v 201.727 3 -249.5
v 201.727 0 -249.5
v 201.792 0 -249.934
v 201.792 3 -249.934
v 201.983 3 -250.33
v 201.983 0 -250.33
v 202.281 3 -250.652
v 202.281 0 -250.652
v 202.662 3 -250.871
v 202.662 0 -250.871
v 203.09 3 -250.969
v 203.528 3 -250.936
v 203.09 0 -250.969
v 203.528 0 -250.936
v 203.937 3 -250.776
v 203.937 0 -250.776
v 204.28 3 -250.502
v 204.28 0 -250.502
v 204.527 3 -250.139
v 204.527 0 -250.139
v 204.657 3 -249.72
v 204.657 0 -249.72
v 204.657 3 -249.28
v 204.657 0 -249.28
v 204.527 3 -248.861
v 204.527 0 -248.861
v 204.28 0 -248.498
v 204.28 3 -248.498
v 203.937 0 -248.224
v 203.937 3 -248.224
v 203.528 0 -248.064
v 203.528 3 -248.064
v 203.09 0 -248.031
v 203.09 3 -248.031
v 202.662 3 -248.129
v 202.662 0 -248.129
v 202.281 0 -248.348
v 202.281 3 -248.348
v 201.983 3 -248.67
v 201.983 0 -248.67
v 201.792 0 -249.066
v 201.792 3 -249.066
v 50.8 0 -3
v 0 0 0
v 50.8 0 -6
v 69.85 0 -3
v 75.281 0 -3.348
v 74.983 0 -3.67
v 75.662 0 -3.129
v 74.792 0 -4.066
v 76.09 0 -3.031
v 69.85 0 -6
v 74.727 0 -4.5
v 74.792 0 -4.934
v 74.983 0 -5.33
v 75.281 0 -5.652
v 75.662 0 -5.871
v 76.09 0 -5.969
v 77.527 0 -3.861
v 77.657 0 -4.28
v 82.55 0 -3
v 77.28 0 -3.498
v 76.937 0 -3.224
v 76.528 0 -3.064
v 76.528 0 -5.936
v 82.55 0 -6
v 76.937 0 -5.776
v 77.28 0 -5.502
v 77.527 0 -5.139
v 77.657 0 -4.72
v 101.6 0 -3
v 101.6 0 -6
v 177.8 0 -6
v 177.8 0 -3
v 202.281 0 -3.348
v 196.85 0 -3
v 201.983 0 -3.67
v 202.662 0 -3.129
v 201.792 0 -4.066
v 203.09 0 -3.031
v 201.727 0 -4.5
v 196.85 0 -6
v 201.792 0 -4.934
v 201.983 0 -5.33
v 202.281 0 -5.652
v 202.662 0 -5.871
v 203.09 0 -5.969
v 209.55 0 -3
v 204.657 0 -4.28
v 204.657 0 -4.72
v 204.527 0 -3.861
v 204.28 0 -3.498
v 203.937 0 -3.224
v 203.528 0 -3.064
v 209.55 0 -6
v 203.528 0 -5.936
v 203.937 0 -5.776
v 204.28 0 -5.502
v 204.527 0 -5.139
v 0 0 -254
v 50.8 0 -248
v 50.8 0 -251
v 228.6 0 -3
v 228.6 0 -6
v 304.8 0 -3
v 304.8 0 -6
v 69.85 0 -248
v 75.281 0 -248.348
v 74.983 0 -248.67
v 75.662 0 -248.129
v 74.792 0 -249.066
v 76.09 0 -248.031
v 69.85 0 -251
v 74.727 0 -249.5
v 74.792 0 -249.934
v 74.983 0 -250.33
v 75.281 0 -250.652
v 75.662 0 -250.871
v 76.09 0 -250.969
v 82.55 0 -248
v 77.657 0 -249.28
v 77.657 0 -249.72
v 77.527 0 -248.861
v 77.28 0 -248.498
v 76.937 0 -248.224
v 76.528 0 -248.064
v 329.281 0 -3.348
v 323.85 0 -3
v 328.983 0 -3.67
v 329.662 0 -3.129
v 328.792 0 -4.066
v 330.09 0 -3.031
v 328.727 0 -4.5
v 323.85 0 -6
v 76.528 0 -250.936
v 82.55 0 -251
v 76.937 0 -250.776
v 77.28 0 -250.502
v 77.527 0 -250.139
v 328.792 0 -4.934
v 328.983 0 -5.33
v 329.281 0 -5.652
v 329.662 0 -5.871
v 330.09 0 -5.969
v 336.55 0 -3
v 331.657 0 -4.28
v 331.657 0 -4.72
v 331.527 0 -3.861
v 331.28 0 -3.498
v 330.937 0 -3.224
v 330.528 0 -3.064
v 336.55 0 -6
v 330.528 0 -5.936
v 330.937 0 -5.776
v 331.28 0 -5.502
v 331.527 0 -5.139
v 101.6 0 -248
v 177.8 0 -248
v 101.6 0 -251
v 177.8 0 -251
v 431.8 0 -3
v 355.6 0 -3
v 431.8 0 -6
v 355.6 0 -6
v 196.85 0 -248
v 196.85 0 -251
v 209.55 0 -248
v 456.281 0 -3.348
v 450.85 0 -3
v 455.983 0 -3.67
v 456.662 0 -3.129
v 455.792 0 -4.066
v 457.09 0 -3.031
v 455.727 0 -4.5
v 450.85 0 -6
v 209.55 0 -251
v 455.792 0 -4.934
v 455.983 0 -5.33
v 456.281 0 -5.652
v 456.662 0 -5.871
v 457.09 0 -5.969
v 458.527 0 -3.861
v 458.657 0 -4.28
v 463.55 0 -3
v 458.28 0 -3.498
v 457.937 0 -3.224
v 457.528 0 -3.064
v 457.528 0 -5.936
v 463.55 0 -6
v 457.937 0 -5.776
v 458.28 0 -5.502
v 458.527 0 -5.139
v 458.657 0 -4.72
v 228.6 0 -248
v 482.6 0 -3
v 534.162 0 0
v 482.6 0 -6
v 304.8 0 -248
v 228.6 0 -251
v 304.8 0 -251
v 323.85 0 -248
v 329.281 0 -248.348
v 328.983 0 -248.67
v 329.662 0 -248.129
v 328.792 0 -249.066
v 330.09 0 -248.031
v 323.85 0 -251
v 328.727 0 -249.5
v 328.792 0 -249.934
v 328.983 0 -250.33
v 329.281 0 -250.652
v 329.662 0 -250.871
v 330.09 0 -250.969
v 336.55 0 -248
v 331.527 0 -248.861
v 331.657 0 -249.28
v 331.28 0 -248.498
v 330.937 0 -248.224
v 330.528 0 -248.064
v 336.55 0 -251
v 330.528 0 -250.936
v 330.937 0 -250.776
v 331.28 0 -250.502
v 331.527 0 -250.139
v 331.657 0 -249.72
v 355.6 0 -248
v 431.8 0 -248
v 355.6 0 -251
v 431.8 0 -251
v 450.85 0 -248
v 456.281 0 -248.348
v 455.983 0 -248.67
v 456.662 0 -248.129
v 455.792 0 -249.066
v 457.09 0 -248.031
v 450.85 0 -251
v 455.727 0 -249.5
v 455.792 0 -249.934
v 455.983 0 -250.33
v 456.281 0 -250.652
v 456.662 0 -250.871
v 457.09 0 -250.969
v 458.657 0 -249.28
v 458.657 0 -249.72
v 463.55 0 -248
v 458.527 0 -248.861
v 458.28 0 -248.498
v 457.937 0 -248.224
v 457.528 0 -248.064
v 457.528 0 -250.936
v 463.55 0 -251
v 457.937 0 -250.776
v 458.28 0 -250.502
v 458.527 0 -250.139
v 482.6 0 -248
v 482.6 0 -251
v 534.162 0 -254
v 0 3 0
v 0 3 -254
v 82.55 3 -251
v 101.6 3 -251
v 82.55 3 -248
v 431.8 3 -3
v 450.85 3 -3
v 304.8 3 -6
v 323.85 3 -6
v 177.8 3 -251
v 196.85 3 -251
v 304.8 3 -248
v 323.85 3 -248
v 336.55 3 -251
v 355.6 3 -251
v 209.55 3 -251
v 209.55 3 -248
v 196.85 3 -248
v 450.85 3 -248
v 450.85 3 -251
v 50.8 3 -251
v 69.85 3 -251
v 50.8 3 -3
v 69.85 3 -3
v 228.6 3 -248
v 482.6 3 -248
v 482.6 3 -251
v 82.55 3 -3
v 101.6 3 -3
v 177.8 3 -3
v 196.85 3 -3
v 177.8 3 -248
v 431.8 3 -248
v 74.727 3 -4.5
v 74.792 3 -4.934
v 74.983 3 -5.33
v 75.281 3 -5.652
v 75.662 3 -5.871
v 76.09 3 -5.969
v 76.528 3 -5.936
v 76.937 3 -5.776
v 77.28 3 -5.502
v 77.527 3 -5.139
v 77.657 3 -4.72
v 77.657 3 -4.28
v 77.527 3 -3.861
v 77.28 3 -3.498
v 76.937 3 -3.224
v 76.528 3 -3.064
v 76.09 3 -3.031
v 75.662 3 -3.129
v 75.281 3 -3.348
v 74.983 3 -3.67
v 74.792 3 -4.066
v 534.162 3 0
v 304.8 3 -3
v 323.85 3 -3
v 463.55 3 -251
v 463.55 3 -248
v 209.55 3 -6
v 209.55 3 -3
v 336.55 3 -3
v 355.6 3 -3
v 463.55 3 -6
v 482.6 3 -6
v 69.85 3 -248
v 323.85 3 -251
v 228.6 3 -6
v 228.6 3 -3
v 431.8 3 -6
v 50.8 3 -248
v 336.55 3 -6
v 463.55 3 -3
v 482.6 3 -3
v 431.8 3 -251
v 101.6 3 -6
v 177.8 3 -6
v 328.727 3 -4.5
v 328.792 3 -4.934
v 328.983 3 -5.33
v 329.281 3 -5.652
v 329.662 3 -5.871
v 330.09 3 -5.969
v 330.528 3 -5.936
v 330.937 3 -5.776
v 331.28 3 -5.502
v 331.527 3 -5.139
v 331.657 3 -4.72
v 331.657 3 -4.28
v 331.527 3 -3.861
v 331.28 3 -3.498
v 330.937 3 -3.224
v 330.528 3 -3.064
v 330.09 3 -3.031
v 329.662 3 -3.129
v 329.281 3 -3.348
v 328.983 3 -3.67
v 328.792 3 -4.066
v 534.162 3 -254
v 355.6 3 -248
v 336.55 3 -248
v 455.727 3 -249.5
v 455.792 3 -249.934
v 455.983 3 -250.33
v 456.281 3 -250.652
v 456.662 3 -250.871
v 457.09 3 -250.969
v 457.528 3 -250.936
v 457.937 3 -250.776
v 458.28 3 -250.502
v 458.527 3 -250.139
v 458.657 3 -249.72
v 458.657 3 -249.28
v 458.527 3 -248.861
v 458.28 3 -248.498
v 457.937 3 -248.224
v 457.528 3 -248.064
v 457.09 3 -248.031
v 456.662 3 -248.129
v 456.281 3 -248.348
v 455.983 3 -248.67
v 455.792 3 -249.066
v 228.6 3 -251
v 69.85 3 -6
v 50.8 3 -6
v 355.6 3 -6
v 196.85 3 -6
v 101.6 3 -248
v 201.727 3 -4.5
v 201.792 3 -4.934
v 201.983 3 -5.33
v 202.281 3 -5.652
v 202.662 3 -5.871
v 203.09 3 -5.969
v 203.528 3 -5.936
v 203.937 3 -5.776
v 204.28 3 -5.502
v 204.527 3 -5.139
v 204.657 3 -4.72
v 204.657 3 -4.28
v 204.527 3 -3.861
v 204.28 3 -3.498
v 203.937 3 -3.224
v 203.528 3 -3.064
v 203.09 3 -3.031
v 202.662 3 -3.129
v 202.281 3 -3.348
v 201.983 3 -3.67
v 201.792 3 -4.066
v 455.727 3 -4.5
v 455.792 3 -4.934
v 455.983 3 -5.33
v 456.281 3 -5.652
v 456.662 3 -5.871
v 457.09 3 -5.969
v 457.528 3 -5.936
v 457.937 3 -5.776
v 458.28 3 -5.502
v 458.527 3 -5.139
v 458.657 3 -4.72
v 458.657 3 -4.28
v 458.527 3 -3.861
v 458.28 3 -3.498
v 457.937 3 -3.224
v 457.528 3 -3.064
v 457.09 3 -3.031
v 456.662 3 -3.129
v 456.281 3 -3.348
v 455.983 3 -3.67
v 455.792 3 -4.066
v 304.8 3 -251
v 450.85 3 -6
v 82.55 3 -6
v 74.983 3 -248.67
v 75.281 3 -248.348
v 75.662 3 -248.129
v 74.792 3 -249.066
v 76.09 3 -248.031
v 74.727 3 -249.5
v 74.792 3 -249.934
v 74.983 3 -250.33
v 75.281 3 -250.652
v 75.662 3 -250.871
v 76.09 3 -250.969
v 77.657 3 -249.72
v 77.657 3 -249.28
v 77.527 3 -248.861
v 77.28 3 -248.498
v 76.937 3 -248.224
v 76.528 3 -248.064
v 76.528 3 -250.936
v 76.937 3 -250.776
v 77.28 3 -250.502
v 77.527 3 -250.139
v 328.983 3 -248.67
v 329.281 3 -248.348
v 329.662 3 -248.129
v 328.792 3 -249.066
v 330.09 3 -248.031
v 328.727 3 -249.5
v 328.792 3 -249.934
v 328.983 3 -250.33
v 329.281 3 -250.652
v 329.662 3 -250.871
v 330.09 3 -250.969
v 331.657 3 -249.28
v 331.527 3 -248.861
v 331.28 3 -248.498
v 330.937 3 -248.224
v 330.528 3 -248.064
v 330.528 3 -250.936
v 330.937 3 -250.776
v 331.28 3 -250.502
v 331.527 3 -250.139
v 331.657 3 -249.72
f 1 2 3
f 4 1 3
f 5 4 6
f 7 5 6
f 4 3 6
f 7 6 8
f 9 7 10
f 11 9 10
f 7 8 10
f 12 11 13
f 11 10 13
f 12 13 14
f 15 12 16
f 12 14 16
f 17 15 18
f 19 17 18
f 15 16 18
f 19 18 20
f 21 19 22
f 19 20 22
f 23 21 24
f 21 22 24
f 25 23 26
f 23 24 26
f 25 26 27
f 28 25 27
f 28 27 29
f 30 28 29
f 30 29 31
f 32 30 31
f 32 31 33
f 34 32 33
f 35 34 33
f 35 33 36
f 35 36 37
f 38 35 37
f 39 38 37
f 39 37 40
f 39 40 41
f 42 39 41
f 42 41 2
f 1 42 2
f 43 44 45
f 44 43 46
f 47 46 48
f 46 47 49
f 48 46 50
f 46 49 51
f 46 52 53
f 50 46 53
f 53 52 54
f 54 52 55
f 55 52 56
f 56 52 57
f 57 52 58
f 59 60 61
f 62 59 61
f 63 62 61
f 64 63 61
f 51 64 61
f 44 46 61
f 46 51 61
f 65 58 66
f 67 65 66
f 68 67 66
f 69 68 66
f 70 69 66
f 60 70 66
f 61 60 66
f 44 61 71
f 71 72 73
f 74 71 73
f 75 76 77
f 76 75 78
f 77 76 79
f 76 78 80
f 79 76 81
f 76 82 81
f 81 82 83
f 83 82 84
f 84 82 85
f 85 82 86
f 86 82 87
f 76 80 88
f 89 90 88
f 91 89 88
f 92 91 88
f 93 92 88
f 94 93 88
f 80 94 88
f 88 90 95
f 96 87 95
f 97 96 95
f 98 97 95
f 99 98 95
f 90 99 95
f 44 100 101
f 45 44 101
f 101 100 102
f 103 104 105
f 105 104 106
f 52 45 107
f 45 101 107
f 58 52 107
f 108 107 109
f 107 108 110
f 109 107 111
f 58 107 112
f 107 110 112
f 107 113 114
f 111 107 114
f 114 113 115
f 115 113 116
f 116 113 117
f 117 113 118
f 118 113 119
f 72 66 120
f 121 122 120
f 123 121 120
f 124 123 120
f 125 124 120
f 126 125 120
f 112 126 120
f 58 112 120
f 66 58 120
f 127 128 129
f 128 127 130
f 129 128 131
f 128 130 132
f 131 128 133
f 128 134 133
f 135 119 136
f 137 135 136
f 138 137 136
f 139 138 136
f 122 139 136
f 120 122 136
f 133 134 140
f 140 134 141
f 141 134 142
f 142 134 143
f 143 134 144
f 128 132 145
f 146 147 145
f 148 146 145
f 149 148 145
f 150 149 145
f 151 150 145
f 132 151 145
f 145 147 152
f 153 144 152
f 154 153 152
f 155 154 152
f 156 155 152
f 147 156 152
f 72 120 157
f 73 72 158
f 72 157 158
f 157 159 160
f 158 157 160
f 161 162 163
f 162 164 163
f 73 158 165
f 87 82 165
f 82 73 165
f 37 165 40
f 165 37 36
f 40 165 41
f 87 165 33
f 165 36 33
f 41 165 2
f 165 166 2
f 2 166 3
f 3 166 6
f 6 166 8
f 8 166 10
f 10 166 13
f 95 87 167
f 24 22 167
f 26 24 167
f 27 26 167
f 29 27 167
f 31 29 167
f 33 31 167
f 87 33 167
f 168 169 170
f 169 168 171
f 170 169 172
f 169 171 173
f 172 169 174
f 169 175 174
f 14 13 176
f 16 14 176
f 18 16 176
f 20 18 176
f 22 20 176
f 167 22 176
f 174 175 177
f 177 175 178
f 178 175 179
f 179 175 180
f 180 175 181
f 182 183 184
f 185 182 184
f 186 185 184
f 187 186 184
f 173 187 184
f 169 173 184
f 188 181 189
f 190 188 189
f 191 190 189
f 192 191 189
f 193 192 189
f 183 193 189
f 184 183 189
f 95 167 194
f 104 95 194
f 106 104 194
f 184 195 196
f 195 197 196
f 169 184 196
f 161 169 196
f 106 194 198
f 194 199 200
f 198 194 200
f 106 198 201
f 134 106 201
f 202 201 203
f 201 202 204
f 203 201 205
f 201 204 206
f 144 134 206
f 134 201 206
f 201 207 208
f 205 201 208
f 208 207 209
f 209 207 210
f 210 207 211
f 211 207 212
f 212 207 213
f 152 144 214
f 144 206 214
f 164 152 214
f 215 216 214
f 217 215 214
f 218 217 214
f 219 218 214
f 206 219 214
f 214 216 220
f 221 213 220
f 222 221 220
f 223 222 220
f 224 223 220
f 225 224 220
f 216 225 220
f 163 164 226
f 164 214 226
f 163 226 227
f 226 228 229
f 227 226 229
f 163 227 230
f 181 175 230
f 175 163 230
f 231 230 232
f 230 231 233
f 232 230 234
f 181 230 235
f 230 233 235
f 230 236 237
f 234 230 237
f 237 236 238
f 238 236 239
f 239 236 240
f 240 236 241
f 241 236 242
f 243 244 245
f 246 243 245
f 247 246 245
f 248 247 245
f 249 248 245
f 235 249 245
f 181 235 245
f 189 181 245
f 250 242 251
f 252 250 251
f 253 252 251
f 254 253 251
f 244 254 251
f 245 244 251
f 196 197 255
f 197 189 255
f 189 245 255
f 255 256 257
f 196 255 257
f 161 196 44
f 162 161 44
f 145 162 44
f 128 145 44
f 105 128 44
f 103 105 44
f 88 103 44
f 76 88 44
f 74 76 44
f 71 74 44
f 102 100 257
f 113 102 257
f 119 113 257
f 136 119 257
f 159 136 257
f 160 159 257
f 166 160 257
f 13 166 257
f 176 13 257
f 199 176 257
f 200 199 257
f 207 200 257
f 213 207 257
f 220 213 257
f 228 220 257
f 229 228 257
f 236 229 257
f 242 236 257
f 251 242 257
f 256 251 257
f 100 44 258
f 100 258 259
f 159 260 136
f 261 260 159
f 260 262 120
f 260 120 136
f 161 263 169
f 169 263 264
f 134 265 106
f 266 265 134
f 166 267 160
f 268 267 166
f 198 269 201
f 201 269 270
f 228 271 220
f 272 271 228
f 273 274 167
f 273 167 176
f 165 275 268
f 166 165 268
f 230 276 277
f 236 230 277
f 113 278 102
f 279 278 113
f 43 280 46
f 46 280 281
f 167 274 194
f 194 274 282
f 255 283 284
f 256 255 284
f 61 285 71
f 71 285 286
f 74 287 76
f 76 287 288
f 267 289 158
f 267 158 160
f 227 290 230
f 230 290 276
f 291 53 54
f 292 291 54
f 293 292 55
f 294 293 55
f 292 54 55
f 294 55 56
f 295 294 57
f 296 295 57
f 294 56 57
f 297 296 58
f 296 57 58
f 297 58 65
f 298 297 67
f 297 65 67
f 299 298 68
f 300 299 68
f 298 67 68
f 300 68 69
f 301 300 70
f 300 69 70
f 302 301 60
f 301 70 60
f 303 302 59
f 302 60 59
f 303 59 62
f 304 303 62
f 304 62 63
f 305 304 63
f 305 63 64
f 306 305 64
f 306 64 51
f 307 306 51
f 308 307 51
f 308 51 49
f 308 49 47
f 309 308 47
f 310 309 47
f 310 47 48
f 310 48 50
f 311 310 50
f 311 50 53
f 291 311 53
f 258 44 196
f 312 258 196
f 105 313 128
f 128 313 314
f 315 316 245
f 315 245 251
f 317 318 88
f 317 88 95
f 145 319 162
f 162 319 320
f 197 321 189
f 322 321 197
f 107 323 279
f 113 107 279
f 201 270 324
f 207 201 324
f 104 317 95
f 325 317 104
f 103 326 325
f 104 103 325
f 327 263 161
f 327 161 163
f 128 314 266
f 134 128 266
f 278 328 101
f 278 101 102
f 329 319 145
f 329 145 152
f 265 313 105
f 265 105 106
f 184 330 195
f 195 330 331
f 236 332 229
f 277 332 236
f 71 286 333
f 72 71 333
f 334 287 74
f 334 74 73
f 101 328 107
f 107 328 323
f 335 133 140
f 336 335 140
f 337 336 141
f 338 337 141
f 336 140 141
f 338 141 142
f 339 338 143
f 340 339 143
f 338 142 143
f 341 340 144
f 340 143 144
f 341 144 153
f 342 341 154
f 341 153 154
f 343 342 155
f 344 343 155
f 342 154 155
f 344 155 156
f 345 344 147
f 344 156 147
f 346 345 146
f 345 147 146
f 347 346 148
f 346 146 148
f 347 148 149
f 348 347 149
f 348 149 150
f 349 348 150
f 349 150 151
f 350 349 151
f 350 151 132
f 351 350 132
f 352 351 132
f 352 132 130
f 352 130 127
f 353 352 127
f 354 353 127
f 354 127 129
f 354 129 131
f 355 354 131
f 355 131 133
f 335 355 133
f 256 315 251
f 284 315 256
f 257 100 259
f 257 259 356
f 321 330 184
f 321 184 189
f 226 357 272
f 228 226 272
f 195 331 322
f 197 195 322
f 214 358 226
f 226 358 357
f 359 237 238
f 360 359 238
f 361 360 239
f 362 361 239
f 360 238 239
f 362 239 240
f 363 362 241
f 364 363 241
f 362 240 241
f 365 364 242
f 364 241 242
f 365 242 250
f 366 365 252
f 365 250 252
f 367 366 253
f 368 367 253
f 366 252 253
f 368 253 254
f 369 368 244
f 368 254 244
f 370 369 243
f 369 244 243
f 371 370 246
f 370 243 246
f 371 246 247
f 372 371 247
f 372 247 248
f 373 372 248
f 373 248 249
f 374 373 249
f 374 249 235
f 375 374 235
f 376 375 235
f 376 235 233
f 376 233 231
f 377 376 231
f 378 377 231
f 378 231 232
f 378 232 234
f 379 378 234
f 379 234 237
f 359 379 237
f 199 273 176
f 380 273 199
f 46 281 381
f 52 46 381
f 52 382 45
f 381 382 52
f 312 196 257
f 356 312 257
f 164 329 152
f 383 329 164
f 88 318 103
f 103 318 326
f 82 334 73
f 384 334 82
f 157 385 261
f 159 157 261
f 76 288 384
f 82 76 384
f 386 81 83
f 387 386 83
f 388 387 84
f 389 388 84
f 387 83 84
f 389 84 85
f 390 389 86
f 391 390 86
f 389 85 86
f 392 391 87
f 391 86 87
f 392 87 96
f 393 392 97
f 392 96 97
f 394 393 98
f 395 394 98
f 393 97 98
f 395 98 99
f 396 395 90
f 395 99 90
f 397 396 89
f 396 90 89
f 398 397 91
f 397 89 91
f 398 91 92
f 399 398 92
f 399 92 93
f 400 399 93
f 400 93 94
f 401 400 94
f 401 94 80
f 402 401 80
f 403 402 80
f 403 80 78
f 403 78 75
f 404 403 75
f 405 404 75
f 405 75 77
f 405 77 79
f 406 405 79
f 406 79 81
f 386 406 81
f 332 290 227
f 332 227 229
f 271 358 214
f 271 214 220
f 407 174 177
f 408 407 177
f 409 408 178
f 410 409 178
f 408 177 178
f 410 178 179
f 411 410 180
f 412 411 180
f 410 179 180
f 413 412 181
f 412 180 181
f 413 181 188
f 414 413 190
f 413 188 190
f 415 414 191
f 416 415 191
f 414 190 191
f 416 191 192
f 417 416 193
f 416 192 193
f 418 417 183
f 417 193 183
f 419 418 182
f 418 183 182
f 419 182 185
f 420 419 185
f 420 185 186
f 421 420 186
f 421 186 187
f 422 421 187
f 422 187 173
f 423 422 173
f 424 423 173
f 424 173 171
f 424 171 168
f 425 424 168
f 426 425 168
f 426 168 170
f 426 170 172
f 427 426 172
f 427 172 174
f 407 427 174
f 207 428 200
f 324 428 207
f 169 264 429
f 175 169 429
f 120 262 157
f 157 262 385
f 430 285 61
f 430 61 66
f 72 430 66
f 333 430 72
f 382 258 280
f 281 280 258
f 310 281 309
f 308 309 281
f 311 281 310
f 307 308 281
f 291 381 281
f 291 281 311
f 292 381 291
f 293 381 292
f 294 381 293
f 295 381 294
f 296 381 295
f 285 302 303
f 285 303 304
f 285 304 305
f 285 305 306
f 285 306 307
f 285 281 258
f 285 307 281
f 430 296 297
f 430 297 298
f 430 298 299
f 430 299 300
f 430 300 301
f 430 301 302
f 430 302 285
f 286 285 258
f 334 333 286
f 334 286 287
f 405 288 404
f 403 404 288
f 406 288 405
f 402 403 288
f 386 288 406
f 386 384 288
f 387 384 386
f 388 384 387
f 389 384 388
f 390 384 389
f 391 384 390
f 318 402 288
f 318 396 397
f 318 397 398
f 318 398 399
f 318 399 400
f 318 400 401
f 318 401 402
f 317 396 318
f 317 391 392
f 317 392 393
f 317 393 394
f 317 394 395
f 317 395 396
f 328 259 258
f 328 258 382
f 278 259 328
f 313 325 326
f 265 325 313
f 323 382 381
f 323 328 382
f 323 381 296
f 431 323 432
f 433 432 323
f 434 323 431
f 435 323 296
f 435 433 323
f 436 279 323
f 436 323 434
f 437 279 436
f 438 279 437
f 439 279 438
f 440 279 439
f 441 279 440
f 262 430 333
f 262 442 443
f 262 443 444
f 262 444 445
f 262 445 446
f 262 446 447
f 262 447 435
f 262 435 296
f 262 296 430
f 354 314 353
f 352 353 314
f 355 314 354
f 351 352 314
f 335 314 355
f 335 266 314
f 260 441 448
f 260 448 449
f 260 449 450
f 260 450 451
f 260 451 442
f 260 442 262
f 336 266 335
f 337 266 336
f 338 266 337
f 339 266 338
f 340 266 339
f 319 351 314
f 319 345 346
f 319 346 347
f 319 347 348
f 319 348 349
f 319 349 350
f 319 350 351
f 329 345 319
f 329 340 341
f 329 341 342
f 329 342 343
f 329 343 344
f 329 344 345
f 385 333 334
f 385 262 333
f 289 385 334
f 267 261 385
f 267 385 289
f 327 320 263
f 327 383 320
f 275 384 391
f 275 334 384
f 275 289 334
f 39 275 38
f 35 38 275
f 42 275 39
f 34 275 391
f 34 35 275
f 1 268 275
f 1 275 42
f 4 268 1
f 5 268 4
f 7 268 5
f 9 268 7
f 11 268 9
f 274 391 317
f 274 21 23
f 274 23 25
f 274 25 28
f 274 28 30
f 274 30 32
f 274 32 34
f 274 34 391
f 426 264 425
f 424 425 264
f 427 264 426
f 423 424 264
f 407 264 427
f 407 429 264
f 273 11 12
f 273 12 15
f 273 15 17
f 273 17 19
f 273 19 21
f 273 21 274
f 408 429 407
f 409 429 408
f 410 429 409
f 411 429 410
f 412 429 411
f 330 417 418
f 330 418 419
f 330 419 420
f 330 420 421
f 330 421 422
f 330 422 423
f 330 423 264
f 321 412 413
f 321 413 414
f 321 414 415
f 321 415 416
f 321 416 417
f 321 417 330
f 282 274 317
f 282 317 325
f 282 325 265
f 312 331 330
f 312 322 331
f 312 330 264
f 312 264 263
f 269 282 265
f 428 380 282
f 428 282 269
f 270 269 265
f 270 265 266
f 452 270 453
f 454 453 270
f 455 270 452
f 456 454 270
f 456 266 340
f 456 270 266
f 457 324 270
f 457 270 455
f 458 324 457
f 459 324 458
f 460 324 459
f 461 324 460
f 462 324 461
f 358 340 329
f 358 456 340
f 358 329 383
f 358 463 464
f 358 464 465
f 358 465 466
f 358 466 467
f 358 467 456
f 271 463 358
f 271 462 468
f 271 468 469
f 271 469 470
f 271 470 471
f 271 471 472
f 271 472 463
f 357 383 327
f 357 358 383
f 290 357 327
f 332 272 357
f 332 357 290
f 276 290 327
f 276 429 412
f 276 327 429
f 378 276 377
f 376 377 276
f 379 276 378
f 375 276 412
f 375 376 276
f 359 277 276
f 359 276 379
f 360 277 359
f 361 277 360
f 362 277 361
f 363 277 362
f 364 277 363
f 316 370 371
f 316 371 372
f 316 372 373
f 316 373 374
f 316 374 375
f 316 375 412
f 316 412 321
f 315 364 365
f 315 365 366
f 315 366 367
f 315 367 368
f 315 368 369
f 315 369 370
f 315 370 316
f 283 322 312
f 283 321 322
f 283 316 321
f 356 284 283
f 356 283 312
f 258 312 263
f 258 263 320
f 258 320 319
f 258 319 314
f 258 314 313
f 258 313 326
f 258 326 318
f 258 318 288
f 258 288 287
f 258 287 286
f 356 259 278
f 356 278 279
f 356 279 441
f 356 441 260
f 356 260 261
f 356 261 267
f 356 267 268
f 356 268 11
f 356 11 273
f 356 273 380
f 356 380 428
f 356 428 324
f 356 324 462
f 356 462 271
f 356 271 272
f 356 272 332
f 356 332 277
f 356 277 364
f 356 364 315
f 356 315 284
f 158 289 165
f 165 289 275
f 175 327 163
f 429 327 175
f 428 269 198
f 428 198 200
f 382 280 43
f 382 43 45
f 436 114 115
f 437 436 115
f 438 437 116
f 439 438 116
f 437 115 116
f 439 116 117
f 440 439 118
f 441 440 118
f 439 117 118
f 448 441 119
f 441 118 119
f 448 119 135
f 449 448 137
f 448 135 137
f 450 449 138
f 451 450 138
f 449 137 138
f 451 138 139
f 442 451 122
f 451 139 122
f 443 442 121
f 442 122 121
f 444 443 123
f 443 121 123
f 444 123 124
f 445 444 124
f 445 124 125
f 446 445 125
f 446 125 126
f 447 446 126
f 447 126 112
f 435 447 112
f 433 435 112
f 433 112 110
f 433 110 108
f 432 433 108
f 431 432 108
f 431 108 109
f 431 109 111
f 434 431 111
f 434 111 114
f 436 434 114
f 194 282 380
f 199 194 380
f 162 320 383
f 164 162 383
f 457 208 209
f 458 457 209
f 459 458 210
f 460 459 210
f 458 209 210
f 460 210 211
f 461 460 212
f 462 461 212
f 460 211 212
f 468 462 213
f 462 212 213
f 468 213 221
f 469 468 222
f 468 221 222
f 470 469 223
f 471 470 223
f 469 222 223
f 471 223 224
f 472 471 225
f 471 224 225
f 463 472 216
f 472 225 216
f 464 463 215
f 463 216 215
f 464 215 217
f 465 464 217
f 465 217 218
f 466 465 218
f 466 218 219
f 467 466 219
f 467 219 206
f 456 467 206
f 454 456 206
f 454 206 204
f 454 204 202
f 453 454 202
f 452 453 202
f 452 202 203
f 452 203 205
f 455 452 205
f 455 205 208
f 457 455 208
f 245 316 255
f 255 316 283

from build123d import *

# Parameters (mm, degrees)
SKETCH1_W             = 534.162
SKETCH1_H             = 254
BOSS_EXTRUDE1_DEPTH   = 3
SKETCH2_W             = 19.05
SKETCH2_H             = 3
CUT_EXTRUDE1_DEPTH    = 4
F_4_CLEARANCE_HOLE1_D = 2.9464


with BuildPart() as part:
    # Sketch1 → Boss-Extrude1 (new body)
    with BuildSketch(Plane(origin=(0, 0, 0), x_dir=(1, 0, 0), z_dir=(0, 1, 0))):
        with Locations((267.081, 127)):
            Rectangle(SKETCH1_W, SKETCH1_H)
    extrude(amount=BOSS_EXTRUDE1_DEPTH)

    # Sketch2 → Cut-Extrude1 (cut, through all)
    with BuildSketch(Plane(origin=(0, 3, 0), x_dir=(1, 0, 0), z_dir=(0, 1, 0))):
        with Locations((60.325, 4.5)):
            Rectangle(SKETCH2_W, SKETCH2_H)
        with Locations((92.075, 4.5)):
            Rectangle(SKETCH2_W, SKETCH2_H)
        with Locations((187.325, 4.5)):
            Rectangle(SKETCH2_W, SKETCH2_H)
        with Locations((219.075, 4.5)):
            Rectangle(SKETCH2_W, SKETCH2_H)
        with Locations((314.325, 4.5)):
            Rectangle(SKETCH2_W, SKETCH2_H)
        with Locations((346.075, 4.5)):
            Rectangle(SKETCH2_W, SKETCH2_H)
        with Locations((441.325, 4.5)):
            Rectangle(SKETCH2_W, SKETCH2_H)
        with Locations((473.075, 4.5)):
            Rectangle(SKETCH2_W, SKETCH2_H)
        with Locations((60.325, 249.5)):
            Rectangle(SKETCH2_W, SKETCH2_H)
        with Locations((92.075, 249.5)):
            Rectangle(SKETCH2_W, SKETCH2_H)
        with Locations((187.325, 249.5)):
            Rectangle(SKETCH2_W, SKETCH2_H)
        with Locations((219.075, 249.5)):
            Rectangle(SKETCH2_W, SKETCH2_H)
        with Locations((314.325, 249.5)):
            Rectangle(SKETCH2_W, SKETCH2_H)
        with Locations((346.075, 249.5)):
            Rectangle(SKETCH2_W, SKETCH2_H)
        with Locations((441.325, 249.5)):
            Rectangle(SKETCH2_W, SKETCH2_H)
        with Locations((473.075, 249.5)):
            Rectangle(SKETCH2_W, SKETCH2_H)
    extrude(amount=-CUT_EXTRUDE1_DEPTH, mode=Mode.SUBTRACT)

    # #4 Clearance Hole1 (through all)
    with Locations(Plane(origin=(0, 3, 0), x_dir=(1, 0, 0), z_dir=(0, 1, 0))):
        with Locations((76.2, 249.5), (203.2, 249.5), (330.2, 249.5), (457.2, 249.5), (457.2, 4.5), (330.2, 4.5), (203.2, 4.5), (76.2, 4.5)):
            Hole(F_4_CLEARANCE_HOLE1_D / 2)


solid = part.part
